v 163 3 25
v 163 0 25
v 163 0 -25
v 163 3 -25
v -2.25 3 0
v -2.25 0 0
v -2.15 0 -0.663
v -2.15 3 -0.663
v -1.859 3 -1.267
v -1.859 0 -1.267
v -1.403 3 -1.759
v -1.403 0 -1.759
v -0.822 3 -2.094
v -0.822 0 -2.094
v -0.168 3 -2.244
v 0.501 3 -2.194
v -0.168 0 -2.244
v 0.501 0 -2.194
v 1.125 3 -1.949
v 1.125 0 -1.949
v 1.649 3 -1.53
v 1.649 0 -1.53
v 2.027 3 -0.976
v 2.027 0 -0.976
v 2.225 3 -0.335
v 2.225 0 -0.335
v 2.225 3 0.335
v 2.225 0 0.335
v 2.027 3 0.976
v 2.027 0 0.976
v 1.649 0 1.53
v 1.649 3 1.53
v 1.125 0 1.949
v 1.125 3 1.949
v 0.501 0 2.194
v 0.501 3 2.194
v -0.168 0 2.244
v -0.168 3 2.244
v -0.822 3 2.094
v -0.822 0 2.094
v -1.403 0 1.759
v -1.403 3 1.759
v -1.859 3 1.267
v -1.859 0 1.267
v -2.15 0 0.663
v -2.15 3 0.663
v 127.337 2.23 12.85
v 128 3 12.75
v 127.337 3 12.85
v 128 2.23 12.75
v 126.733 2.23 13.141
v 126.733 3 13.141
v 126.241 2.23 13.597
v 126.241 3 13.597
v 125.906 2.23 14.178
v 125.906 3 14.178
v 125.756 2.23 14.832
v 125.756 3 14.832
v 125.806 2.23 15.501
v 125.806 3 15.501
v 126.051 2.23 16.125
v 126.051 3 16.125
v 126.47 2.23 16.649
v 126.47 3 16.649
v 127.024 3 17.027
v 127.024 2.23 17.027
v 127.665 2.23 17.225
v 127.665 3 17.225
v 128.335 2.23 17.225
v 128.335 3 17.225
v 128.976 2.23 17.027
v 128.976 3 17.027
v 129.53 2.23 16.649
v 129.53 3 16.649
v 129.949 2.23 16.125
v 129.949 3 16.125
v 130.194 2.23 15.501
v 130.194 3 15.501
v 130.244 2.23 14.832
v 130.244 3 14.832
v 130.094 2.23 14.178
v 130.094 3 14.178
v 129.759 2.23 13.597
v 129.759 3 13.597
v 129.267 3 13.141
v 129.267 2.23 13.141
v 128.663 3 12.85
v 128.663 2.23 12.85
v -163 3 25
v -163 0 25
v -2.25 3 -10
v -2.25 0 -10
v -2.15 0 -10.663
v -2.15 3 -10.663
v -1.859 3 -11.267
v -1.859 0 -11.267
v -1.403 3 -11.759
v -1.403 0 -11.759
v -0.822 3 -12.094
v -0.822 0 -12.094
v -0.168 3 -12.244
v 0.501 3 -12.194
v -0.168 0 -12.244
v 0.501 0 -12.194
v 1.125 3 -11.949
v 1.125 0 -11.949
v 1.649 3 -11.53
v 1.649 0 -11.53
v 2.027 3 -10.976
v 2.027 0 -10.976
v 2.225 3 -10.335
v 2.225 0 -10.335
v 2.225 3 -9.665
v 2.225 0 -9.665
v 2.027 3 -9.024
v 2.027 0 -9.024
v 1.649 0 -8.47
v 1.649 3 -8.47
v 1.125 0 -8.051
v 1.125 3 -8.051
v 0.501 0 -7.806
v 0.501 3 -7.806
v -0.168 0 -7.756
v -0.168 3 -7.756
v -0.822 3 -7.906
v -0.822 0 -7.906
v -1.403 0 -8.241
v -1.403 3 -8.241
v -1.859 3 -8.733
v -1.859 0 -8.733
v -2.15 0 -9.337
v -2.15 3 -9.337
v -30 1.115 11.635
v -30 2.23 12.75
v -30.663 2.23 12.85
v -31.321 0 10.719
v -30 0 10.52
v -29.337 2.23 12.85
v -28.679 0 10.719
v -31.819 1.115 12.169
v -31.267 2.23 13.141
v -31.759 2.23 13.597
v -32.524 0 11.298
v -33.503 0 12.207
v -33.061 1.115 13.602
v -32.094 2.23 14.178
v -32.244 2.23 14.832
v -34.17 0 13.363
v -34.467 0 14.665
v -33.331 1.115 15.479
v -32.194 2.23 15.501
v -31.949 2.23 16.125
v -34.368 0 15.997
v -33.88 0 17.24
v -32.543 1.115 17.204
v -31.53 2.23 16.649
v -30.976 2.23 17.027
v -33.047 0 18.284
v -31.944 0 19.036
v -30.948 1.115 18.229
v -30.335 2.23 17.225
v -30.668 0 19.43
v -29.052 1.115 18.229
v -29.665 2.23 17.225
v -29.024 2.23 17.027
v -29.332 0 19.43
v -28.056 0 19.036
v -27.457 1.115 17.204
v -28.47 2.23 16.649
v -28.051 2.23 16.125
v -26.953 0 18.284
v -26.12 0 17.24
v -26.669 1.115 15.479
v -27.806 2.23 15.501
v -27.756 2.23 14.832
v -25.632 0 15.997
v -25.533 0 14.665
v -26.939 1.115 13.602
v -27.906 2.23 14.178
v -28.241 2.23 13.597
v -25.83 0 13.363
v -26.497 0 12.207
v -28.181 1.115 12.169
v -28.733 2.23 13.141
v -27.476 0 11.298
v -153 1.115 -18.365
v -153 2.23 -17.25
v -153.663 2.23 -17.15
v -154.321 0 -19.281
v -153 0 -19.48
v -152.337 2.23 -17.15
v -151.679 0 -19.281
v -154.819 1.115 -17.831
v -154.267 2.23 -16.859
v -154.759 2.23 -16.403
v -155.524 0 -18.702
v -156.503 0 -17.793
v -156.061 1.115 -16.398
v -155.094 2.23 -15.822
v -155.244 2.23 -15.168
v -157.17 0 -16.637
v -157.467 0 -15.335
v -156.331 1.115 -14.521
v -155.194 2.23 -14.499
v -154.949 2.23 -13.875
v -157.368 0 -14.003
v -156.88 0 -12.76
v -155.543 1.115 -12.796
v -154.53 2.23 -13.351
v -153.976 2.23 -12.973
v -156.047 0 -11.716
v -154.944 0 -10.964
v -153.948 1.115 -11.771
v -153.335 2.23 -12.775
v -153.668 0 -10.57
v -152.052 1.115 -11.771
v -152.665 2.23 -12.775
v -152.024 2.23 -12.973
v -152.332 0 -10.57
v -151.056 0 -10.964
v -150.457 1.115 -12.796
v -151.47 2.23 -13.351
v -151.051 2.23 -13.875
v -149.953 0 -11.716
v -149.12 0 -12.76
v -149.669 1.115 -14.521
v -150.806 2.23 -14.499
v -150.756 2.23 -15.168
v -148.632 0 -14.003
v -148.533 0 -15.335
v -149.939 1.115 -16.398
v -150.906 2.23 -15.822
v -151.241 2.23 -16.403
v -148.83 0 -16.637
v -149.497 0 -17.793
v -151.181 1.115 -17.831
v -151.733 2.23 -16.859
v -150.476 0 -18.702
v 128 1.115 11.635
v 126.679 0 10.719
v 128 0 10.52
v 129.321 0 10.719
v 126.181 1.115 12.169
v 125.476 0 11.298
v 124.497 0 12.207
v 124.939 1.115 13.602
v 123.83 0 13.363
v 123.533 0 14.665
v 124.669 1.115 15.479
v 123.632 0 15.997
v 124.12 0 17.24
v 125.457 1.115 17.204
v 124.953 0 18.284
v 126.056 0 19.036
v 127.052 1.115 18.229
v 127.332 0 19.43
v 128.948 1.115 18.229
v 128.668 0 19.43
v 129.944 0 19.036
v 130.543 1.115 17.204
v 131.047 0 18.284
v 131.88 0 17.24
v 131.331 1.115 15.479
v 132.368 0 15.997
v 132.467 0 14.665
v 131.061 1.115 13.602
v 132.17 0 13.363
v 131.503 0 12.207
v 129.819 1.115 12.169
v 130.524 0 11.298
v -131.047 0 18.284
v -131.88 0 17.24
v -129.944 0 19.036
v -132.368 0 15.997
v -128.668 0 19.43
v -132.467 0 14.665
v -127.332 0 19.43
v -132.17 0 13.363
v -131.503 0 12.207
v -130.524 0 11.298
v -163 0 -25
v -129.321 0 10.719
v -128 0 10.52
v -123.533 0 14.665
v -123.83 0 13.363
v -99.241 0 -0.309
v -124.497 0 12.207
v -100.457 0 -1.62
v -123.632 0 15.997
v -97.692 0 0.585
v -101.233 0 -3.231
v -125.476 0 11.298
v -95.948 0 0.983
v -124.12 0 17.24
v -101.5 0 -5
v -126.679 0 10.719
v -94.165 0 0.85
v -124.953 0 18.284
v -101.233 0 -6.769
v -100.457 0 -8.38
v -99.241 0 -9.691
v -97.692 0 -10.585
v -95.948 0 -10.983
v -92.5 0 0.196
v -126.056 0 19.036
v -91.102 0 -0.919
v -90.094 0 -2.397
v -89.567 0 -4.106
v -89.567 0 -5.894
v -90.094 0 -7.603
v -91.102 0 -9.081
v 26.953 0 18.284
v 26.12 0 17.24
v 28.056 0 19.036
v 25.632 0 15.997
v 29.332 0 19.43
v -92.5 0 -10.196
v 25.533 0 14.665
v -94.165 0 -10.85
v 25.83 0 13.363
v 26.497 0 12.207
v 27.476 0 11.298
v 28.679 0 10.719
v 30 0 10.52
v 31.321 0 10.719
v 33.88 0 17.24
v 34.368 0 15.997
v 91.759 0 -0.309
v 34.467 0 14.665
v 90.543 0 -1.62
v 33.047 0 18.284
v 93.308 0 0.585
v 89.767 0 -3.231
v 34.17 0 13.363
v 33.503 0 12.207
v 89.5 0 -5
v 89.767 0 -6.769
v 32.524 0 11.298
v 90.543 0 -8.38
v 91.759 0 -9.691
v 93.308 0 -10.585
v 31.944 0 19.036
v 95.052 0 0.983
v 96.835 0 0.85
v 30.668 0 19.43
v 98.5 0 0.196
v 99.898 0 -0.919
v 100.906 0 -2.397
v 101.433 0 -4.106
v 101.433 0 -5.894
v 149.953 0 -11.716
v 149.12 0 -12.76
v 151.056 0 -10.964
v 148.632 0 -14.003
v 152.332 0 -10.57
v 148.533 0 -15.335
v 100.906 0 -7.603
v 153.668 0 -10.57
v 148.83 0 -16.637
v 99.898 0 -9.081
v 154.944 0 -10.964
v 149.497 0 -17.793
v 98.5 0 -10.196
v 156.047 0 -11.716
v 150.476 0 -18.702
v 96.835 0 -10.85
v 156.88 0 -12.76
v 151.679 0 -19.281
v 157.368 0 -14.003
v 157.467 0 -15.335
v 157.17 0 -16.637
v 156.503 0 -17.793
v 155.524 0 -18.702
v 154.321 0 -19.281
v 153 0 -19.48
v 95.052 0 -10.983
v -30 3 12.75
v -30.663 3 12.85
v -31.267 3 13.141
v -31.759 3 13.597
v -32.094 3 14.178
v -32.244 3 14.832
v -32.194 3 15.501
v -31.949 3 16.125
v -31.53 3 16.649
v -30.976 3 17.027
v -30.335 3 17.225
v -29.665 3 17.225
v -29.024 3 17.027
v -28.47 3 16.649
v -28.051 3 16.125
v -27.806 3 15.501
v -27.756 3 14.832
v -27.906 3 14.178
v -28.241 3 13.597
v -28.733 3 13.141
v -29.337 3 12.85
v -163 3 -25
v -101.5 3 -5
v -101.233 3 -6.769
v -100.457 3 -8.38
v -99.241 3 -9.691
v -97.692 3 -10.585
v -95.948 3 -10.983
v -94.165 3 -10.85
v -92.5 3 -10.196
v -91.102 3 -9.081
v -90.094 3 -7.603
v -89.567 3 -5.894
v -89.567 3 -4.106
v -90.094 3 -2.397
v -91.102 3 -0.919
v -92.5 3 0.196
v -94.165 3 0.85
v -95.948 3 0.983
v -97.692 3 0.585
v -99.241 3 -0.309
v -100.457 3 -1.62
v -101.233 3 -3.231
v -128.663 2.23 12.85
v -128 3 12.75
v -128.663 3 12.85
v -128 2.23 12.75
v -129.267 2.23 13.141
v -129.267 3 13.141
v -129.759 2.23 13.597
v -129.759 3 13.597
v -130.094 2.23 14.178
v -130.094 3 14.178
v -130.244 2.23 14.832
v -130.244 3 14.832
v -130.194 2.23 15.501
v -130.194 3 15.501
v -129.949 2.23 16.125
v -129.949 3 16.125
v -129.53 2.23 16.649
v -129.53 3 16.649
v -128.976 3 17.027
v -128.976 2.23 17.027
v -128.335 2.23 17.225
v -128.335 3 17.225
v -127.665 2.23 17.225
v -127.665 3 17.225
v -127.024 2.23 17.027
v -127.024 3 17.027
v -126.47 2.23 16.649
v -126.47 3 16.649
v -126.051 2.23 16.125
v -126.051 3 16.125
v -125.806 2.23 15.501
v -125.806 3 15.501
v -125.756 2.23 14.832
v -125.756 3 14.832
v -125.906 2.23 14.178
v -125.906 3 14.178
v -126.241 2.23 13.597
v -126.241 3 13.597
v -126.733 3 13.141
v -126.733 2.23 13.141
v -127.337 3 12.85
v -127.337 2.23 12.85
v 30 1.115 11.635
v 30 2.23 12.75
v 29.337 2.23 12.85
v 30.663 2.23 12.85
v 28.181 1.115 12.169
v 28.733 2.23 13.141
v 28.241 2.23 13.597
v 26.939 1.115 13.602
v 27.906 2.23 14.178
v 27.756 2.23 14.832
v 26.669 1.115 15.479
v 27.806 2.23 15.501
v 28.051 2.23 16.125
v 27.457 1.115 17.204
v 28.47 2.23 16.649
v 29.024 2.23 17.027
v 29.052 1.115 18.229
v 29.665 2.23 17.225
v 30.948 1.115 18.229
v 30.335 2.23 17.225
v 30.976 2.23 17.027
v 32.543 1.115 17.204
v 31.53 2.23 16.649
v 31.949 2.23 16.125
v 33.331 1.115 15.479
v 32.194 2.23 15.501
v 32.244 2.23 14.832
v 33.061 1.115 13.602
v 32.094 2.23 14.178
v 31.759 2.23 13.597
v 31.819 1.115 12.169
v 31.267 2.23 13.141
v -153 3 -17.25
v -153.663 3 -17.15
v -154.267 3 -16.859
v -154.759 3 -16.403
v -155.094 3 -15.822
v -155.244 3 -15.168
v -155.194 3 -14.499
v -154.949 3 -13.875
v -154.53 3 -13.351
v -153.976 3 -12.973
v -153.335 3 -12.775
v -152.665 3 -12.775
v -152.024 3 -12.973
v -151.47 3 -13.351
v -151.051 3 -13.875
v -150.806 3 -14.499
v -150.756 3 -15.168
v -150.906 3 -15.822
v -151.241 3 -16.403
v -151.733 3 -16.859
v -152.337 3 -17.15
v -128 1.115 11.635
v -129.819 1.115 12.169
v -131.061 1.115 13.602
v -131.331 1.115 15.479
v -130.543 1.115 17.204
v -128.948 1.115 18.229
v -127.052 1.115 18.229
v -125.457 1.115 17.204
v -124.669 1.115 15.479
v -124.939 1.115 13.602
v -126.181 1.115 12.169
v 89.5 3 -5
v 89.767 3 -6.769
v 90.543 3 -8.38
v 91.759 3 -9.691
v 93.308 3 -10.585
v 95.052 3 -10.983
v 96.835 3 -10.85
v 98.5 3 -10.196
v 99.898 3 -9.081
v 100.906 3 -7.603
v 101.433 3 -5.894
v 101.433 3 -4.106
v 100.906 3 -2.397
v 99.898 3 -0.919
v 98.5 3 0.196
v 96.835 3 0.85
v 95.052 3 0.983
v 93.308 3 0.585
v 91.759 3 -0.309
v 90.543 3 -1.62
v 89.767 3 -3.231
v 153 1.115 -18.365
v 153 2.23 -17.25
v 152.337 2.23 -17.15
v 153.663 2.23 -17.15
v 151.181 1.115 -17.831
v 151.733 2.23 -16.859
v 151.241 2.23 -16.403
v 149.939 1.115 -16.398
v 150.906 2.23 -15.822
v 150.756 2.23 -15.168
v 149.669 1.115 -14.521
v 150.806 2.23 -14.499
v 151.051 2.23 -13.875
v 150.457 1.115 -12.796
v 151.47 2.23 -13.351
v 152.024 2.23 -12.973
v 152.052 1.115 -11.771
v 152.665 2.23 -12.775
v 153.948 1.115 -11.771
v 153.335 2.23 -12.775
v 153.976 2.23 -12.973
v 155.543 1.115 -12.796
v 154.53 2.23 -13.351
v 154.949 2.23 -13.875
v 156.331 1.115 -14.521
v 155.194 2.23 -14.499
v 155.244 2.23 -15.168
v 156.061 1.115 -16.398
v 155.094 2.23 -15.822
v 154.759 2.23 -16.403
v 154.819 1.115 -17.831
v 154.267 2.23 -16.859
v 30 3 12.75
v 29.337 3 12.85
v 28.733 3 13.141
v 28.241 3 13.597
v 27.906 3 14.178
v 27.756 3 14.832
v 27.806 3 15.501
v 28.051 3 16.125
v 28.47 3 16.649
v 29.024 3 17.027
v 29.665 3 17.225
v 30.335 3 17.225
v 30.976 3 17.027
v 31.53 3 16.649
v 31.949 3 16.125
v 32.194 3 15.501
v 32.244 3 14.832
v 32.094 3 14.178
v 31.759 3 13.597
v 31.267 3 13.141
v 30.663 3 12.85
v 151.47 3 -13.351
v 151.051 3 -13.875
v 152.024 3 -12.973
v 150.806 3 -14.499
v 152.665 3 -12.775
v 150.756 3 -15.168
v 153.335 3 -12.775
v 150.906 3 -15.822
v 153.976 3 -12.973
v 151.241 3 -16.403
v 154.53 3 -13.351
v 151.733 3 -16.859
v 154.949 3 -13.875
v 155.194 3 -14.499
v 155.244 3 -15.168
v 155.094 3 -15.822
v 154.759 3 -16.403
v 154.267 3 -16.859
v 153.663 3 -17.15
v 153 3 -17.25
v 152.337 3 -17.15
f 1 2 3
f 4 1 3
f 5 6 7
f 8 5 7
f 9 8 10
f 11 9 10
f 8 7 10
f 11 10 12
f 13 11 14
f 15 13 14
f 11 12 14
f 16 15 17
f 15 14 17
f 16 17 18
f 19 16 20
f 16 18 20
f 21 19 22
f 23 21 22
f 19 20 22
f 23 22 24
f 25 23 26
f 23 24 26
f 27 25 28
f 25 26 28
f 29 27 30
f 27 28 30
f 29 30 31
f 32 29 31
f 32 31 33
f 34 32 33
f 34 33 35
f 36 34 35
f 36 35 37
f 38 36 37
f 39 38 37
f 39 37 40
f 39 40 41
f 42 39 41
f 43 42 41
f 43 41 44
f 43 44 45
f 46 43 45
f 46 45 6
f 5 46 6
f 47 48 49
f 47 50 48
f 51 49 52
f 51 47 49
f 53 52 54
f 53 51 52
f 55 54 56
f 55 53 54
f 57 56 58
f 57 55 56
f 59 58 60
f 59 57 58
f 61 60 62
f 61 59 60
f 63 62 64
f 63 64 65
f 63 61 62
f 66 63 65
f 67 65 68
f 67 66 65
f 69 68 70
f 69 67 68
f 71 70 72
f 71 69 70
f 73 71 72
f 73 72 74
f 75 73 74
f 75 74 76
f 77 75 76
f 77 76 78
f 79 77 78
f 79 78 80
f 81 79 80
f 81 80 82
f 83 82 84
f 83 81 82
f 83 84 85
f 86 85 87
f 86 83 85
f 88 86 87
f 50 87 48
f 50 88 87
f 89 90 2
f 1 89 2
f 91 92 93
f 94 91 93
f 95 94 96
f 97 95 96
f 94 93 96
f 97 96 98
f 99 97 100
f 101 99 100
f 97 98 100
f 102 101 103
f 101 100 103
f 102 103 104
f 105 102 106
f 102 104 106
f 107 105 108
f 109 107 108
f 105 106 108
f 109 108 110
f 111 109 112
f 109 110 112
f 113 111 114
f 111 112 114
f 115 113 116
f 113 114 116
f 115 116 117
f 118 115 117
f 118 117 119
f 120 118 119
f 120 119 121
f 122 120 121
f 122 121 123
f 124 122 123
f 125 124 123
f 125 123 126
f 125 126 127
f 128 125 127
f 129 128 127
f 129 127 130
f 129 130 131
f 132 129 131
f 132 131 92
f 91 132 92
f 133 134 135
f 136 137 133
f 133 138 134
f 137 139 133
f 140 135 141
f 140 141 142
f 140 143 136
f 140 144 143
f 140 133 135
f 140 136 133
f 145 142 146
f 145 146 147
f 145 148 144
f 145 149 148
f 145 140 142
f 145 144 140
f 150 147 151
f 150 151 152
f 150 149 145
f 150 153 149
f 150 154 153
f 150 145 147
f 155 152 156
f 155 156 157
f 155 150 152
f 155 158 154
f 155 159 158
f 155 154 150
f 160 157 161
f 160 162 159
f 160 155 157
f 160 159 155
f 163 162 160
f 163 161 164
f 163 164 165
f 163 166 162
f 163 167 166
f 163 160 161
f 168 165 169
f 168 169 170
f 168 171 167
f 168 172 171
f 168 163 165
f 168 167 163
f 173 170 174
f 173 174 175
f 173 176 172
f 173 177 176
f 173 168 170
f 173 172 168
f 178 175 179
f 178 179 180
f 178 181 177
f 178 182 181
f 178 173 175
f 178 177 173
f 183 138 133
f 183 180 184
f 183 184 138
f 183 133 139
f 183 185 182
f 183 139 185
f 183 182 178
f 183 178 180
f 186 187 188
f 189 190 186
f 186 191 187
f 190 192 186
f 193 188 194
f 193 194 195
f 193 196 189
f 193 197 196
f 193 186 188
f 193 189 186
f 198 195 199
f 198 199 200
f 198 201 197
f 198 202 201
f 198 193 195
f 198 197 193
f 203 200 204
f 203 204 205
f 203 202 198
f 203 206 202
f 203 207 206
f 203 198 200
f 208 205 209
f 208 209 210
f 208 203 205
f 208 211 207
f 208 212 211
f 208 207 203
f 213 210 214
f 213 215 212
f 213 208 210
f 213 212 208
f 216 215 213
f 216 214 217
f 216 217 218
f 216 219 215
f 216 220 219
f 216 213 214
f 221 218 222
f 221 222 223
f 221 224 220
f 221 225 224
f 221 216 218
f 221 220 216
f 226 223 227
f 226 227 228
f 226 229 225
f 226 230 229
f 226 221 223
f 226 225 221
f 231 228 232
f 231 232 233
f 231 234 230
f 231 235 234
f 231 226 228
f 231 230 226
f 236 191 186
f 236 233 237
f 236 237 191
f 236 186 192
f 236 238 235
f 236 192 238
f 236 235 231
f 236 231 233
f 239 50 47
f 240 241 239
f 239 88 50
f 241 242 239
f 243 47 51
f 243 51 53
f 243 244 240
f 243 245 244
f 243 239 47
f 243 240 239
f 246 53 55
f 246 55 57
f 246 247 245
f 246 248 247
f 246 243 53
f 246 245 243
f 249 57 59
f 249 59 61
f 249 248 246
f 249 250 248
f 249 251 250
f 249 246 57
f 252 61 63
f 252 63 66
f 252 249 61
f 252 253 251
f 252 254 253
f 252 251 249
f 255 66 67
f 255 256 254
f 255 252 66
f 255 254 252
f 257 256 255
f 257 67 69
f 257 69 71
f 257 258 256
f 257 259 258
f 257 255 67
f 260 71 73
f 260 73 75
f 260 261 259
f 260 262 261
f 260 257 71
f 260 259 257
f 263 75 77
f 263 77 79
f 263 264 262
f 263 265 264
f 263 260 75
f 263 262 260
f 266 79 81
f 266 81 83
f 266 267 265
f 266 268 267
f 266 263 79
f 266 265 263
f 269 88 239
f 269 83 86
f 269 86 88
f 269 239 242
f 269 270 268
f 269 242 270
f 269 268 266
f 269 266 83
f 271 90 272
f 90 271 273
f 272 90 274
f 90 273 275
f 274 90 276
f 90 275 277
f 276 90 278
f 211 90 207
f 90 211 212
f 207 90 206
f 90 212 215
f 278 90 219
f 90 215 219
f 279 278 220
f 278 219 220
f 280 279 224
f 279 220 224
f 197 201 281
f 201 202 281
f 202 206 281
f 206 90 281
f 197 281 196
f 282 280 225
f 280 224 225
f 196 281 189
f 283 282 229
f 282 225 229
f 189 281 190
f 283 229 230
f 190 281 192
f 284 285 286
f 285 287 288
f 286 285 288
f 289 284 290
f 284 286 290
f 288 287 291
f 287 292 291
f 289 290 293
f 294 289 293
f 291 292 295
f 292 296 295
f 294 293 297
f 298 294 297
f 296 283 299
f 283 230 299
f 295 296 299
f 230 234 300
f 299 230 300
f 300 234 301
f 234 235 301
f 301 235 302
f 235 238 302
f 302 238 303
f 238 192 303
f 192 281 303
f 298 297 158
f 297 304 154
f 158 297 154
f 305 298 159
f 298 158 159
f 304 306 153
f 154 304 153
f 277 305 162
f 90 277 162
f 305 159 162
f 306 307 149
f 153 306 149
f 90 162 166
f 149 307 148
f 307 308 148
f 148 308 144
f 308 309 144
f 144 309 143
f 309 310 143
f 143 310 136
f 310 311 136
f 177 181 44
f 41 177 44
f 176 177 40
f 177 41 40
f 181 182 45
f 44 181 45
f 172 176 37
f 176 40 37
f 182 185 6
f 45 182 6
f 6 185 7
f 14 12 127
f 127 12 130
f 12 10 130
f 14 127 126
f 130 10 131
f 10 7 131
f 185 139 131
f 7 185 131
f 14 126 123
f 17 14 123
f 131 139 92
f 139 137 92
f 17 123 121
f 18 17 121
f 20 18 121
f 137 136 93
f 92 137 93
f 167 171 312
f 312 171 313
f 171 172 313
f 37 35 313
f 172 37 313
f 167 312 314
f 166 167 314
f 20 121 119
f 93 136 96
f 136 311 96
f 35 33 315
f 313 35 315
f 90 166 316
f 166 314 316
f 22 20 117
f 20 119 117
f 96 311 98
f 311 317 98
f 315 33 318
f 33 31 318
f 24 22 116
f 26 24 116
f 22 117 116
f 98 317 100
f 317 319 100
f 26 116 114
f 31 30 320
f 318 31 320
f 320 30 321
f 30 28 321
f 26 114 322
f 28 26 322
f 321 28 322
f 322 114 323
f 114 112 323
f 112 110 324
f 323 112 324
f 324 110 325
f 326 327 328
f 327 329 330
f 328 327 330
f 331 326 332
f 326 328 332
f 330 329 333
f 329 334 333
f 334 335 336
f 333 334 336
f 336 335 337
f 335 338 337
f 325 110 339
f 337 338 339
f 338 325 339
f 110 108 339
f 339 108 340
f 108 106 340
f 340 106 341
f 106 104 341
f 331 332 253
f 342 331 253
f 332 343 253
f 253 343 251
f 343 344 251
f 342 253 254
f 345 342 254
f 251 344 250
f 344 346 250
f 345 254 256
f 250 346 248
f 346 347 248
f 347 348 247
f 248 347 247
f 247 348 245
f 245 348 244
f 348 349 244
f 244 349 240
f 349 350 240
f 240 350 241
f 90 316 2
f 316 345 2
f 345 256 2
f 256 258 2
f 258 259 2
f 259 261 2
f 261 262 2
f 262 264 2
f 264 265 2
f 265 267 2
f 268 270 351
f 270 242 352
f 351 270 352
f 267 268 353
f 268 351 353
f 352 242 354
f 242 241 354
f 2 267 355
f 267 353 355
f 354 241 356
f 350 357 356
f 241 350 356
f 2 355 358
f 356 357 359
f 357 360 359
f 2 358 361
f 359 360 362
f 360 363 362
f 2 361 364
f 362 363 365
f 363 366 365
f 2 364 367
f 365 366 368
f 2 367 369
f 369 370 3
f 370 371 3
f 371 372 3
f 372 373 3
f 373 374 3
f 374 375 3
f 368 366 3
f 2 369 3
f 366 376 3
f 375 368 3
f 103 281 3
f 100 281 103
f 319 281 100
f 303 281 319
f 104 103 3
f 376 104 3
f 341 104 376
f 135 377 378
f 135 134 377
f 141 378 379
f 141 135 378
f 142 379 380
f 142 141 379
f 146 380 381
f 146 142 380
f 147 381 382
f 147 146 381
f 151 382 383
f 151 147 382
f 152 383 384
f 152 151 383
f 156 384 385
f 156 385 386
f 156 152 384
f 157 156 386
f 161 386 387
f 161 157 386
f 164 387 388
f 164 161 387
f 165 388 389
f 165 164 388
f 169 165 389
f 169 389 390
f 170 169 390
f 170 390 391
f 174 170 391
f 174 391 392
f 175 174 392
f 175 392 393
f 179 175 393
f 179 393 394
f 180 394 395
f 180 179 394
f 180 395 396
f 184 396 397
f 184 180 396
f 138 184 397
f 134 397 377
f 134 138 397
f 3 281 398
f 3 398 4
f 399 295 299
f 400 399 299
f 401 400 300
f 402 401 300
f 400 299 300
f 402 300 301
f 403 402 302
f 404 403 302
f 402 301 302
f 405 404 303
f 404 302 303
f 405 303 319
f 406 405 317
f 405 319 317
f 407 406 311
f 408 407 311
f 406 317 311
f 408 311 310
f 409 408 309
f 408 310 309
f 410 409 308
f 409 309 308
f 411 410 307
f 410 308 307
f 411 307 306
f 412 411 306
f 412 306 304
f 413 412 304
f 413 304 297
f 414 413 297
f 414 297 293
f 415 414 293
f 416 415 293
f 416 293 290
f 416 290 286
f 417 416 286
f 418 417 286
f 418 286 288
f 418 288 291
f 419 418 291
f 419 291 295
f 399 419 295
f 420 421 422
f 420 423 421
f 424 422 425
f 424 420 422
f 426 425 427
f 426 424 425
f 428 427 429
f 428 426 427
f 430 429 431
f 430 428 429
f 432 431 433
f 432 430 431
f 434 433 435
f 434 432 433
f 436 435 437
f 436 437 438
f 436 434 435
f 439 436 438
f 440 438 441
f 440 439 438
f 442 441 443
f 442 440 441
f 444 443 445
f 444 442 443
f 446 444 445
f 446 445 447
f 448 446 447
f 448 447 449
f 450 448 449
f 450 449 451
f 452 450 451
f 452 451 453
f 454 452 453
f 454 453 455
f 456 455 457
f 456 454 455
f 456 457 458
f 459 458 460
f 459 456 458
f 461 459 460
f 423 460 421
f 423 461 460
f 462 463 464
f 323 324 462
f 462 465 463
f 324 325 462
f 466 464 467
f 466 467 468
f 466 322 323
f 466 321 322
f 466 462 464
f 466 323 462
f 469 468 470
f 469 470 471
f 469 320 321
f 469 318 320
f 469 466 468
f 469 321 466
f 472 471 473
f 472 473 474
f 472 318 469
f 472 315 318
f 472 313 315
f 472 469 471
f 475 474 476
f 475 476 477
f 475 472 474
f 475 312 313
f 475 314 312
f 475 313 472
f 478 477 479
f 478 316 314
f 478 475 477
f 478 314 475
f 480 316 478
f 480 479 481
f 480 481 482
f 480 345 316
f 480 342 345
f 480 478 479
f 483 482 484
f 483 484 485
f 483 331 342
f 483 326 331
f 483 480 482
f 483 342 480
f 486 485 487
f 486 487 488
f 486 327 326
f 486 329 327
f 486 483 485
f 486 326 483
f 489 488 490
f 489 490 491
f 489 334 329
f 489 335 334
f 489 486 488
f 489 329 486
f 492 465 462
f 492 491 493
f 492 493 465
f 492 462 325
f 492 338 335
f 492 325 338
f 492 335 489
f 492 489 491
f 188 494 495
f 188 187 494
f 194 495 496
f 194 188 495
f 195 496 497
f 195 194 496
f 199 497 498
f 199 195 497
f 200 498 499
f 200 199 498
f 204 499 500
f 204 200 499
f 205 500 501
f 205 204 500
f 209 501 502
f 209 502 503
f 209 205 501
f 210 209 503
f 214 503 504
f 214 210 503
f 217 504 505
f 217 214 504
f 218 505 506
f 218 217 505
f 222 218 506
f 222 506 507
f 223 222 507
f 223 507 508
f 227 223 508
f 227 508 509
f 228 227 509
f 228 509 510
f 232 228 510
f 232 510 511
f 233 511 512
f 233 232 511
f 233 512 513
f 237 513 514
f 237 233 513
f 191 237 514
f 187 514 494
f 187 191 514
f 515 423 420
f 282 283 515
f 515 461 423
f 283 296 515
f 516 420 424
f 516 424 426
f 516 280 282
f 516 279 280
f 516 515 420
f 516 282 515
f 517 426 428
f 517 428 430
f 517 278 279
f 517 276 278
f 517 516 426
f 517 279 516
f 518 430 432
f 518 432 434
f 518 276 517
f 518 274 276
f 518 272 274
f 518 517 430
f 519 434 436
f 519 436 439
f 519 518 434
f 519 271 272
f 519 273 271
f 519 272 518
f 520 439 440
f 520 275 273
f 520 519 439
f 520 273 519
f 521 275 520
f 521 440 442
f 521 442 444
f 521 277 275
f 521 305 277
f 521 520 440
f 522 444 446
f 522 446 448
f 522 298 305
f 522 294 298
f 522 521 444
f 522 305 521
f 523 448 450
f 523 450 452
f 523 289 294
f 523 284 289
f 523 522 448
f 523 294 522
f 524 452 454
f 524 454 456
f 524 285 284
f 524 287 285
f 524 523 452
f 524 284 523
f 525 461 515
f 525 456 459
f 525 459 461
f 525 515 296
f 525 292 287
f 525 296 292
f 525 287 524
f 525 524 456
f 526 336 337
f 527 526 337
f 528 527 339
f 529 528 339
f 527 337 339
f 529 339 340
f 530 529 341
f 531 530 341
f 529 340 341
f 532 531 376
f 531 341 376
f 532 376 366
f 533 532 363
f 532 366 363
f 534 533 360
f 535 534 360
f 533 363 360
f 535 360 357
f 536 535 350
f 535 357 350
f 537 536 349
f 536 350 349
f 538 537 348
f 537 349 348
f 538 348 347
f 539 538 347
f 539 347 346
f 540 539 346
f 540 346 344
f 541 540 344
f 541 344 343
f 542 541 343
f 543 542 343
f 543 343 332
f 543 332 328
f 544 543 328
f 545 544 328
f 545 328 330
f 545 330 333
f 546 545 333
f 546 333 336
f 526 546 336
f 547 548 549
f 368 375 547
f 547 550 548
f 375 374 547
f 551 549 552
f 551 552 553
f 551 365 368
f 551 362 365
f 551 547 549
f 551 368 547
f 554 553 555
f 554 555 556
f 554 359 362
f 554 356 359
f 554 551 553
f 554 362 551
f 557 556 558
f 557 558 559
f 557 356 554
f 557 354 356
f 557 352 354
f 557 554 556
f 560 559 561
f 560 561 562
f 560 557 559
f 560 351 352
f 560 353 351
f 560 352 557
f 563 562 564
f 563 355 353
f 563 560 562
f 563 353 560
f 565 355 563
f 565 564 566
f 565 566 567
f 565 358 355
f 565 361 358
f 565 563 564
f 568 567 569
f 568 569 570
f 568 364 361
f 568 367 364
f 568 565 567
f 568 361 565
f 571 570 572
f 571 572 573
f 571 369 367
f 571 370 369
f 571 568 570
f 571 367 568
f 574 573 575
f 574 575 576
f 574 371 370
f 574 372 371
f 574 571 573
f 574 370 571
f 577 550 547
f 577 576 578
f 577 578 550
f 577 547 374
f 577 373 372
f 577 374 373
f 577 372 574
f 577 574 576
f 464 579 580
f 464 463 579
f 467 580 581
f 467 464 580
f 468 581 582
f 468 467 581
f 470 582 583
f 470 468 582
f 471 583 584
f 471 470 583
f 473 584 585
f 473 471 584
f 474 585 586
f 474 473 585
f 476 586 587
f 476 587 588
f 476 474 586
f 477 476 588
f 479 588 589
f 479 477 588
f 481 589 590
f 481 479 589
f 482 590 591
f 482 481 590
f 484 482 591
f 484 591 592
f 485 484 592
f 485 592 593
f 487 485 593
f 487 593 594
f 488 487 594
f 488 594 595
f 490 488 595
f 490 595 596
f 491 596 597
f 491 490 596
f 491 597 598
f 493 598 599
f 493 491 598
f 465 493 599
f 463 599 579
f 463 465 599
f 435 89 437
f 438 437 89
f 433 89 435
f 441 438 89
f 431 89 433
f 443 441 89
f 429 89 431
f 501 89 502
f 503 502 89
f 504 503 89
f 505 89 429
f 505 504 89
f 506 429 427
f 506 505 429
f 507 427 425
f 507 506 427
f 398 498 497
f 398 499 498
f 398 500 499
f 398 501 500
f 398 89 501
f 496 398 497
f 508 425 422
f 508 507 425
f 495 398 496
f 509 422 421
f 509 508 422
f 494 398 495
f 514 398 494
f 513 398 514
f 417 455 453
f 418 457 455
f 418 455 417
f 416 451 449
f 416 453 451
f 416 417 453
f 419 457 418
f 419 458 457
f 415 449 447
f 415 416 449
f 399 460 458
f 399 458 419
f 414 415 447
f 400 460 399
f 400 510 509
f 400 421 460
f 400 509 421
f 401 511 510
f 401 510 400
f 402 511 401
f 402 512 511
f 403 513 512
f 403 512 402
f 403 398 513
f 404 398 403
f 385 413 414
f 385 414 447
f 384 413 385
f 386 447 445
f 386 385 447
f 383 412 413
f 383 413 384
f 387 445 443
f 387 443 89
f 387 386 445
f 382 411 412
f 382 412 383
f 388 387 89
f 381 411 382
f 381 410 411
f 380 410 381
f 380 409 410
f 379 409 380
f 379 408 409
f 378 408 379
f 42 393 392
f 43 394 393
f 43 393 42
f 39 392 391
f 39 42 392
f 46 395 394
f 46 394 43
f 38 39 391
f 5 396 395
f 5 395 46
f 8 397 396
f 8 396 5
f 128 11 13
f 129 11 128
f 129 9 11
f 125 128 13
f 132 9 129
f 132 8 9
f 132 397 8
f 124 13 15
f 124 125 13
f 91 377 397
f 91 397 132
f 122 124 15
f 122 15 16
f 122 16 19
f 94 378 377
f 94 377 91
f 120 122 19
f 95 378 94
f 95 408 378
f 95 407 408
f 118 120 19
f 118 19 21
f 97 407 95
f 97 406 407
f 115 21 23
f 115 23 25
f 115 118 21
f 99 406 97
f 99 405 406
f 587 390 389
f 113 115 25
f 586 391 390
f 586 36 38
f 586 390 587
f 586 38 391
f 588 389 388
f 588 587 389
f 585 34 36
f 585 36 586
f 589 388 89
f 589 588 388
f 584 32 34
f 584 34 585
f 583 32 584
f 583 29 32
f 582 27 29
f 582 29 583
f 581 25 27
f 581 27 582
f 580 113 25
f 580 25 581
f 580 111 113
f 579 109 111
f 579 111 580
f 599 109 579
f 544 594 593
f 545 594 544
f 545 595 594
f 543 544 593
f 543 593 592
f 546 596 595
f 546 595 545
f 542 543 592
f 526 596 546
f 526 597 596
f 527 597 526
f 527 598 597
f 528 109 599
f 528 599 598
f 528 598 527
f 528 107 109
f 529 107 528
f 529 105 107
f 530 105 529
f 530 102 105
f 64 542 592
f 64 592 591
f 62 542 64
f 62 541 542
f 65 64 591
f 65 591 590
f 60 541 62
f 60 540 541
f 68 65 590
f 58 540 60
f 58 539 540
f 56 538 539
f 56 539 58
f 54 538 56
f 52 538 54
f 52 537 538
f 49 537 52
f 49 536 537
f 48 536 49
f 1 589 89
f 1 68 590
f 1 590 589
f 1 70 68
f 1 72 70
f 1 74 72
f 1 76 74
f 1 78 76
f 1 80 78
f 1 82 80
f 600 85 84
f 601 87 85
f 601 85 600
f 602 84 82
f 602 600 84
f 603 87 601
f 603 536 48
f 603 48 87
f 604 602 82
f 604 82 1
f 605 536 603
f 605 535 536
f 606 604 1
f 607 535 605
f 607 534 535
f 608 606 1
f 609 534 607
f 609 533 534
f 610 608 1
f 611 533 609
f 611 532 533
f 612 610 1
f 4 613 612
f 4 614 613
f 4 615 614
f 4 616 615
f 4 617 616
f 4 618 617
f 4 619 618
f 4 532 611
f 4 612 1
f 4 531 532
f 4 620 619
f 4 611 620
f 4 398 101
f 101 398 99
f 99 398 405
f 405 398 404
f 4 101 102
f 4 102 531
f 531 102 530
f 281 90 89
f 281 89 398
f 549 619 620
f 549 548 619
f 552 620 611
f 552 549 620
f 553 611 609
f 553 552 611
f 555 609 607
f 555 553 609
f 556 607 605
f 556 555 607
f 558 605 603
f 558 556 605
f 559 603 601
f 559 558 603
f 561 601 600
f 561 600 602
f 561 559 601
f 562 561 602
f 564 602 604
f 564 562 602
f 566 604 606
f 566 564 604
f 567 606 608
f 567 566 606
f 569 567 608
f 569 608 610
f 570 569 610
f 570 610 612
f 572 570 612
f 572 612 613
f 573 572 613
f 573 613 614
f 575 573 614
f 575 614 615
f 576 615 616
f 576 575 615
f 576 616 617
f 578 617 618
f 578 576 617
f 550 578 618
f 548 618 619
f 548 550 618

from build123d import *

# Parameters (mm, degrees)
SKIZZE1_W                            = 326
SKIZZE1_H                            = 50
AUFSATZ_LINEAR_AUSTRAGEN1_DEPTH      = 3
DURCHGANGSLOCH_F_R_M41_D             = 4.5
F_9_0_12_DURCHMESSER_BOHRUNG1_D      = 12
FORMSENKUNG_F_R_M4_SFHCS1_AT_2_COUNT = 2
FORMSENKUNG_F_R_M4_SFHCS1_AT_2_PITCH = 306
FORMSENKUNG_F_R_M4_SFHCS1_AT_3_COUNT = 2
FORMSENKUNG_F_R_M4_SFHCS1_AT_3_PITCH = 282.596886041
FORMSENKUNG_F_R_M4_SFHCS1_AT_4_COUNT = 2
FORMSENKUNG_F_R_M4_SFHCS1_AT_4_PITCH = 185.442713526
FORMSENKUNG_F_R_M4_SFHCS1_AT_5_COUNT = 2
FORMSENKUNG_F_R_M4_SFHCS1_AT_5_PITCH = 126.605687076
FORMSENKUNG_F_R_M4_SFHCS1_AT_6_COUNT = 2
FORMSENKUNG_F_R_M4_SFHCS1_AT_6_PITCH = 39.05124838


with BuildPart() as part:
    # Skizze1 → Aufsatz-Linear austragen1 (new body)
    with BuildSketch(Plane(origin=(0, 0, 0), x_dir=(1, 0, 0), z_dir=(0, 1, 0))):
        Rectangle(SKIZZE1_W, SKIZZE1_H)
    extrude(amount=AUFSATZ_LINEAR_AUSTRAGEN1_DEPTH)

    # Durchgangsloch für M41 (through all)
    with Locations(Plane(origin=(0, 3, 0), x_dir=(1, 0, 0), z_dir=(0, 1, 0))):
        with Locations((0, 0), (0, 10)):
            Hole(DURCHGANGSLOCH_F_R_M41_D / 2)

    # Ø9.0 (12) Durchmesser Bohrung1 (through all)
    with Locations(Plane(origin=(0, 3, 0), x_dir=(1, 0, 0), z_dir=(0, 1, 0))):
        with Locations((-95.5, 5), (95.5, 5)):
            Hole(F_9_0_12_DURCHMESSER_BOHRUNG1_D / 2)

    # Skizze7 → Formsenkung für M4 SFHCS1 (revolve, cut)
    with BuildSketch(Plane(origin=(153, 0, -15), x_dir=(0, 0, -1), z_dir=(1, 0, 0))):
        Polygon((0, 0), (0, 3), (2.25, 3), (2.25, 2.23), (4.48, 0), align=None)
    formsenkung_f_r_m4_sfhcs1 = revolve(axis=Axis((153, -6.35, -15), (0, 1, 0)), mode=Mode.SUBTRACT)

    # Formsenkung für M4 SFHCS1 at 2: Formsenkung für M4 SFHCS1 ×2
    with Locations(*[(-i * FORMSENKUNG_F_R_M4_SFHCS1_AT_2_PITCH, 0, 0) for i in range(1, FORMSENKUNG_F_R_M4_SFHCS1_AT_2_COUNT)]):
        add(formsenkung_f_r_m4_sfhcs1, mode=Mode.SUBTRACT)

    # Formsenkung für M4 SFHCS1 at 3: Formsenkung für M4 SFHCS1 ×2
    with Locations(*[Vector(-0.9943492440300802, 0, 0.10615828228079148) * (i * FORMSENKUNG_F_R_M4_SFHCS1_AT_3_PITCH) for i in range(1, FORMSENKUNG_F_R_M4_SFHCS1_AT_3_COUNT)]):
        add(formsenkung_f_r_m4_sfhcs1, mode=Mode.SUBTRACT)

    # Formsenkung für M4 SFHCS1 at 4: Formsenkung für M4 SFHCS1 ×2
    with Locations(*[Vector(-0.9868276651055338, 0, 0.16177502706648092) * (i * FORMSENKUNG_F_R_M4_SFHCS1_AT_4_PITCH) for i in range(1, FORMSENKUNG_F_R_M4_SFHCS1_AT_4_COUNT)]):
        add(formsenkung_f_r_m4_sfhcs1, mode=Mode.SUBTRACT)

    # Formsenkung für M4 SFHCS1 at 5: Formsenkung für M4 SFHCS1 ×2
    with Locations(*[Vector(-0.9715203387831296, 0, 0.23695618019100717) * (i * FORMSENKUNG_F_R_M4_SFHCS1_AT_5_PITCH) for i in range(1, FORMSENKUNG_F_R_M4_SFHCS1_AT_5_COUNT)]):
        add(formsenkung_f_r_m4_sfhcs1, mode=Mode.SUBTRACT)

    # Formsenkung für M4 SFHCS1 at 6: Formsenkung für M4 SFHCS1 ×2
    with Locations(*[Vector(-0.6401843996644799, 0, 0.7682212795973759) * (i * FORMSENKUNG_F_R_M4_SFHCS1_AT_6_PITCH) for i in range(1, FORMSENKUNG_F_R_M4_SFHCS1_AT_6_COUNT)]):
        add(formsenkung_f_r_m4_sfhcs1, mode=Mode.SUBTRACT)


solid = part.part
